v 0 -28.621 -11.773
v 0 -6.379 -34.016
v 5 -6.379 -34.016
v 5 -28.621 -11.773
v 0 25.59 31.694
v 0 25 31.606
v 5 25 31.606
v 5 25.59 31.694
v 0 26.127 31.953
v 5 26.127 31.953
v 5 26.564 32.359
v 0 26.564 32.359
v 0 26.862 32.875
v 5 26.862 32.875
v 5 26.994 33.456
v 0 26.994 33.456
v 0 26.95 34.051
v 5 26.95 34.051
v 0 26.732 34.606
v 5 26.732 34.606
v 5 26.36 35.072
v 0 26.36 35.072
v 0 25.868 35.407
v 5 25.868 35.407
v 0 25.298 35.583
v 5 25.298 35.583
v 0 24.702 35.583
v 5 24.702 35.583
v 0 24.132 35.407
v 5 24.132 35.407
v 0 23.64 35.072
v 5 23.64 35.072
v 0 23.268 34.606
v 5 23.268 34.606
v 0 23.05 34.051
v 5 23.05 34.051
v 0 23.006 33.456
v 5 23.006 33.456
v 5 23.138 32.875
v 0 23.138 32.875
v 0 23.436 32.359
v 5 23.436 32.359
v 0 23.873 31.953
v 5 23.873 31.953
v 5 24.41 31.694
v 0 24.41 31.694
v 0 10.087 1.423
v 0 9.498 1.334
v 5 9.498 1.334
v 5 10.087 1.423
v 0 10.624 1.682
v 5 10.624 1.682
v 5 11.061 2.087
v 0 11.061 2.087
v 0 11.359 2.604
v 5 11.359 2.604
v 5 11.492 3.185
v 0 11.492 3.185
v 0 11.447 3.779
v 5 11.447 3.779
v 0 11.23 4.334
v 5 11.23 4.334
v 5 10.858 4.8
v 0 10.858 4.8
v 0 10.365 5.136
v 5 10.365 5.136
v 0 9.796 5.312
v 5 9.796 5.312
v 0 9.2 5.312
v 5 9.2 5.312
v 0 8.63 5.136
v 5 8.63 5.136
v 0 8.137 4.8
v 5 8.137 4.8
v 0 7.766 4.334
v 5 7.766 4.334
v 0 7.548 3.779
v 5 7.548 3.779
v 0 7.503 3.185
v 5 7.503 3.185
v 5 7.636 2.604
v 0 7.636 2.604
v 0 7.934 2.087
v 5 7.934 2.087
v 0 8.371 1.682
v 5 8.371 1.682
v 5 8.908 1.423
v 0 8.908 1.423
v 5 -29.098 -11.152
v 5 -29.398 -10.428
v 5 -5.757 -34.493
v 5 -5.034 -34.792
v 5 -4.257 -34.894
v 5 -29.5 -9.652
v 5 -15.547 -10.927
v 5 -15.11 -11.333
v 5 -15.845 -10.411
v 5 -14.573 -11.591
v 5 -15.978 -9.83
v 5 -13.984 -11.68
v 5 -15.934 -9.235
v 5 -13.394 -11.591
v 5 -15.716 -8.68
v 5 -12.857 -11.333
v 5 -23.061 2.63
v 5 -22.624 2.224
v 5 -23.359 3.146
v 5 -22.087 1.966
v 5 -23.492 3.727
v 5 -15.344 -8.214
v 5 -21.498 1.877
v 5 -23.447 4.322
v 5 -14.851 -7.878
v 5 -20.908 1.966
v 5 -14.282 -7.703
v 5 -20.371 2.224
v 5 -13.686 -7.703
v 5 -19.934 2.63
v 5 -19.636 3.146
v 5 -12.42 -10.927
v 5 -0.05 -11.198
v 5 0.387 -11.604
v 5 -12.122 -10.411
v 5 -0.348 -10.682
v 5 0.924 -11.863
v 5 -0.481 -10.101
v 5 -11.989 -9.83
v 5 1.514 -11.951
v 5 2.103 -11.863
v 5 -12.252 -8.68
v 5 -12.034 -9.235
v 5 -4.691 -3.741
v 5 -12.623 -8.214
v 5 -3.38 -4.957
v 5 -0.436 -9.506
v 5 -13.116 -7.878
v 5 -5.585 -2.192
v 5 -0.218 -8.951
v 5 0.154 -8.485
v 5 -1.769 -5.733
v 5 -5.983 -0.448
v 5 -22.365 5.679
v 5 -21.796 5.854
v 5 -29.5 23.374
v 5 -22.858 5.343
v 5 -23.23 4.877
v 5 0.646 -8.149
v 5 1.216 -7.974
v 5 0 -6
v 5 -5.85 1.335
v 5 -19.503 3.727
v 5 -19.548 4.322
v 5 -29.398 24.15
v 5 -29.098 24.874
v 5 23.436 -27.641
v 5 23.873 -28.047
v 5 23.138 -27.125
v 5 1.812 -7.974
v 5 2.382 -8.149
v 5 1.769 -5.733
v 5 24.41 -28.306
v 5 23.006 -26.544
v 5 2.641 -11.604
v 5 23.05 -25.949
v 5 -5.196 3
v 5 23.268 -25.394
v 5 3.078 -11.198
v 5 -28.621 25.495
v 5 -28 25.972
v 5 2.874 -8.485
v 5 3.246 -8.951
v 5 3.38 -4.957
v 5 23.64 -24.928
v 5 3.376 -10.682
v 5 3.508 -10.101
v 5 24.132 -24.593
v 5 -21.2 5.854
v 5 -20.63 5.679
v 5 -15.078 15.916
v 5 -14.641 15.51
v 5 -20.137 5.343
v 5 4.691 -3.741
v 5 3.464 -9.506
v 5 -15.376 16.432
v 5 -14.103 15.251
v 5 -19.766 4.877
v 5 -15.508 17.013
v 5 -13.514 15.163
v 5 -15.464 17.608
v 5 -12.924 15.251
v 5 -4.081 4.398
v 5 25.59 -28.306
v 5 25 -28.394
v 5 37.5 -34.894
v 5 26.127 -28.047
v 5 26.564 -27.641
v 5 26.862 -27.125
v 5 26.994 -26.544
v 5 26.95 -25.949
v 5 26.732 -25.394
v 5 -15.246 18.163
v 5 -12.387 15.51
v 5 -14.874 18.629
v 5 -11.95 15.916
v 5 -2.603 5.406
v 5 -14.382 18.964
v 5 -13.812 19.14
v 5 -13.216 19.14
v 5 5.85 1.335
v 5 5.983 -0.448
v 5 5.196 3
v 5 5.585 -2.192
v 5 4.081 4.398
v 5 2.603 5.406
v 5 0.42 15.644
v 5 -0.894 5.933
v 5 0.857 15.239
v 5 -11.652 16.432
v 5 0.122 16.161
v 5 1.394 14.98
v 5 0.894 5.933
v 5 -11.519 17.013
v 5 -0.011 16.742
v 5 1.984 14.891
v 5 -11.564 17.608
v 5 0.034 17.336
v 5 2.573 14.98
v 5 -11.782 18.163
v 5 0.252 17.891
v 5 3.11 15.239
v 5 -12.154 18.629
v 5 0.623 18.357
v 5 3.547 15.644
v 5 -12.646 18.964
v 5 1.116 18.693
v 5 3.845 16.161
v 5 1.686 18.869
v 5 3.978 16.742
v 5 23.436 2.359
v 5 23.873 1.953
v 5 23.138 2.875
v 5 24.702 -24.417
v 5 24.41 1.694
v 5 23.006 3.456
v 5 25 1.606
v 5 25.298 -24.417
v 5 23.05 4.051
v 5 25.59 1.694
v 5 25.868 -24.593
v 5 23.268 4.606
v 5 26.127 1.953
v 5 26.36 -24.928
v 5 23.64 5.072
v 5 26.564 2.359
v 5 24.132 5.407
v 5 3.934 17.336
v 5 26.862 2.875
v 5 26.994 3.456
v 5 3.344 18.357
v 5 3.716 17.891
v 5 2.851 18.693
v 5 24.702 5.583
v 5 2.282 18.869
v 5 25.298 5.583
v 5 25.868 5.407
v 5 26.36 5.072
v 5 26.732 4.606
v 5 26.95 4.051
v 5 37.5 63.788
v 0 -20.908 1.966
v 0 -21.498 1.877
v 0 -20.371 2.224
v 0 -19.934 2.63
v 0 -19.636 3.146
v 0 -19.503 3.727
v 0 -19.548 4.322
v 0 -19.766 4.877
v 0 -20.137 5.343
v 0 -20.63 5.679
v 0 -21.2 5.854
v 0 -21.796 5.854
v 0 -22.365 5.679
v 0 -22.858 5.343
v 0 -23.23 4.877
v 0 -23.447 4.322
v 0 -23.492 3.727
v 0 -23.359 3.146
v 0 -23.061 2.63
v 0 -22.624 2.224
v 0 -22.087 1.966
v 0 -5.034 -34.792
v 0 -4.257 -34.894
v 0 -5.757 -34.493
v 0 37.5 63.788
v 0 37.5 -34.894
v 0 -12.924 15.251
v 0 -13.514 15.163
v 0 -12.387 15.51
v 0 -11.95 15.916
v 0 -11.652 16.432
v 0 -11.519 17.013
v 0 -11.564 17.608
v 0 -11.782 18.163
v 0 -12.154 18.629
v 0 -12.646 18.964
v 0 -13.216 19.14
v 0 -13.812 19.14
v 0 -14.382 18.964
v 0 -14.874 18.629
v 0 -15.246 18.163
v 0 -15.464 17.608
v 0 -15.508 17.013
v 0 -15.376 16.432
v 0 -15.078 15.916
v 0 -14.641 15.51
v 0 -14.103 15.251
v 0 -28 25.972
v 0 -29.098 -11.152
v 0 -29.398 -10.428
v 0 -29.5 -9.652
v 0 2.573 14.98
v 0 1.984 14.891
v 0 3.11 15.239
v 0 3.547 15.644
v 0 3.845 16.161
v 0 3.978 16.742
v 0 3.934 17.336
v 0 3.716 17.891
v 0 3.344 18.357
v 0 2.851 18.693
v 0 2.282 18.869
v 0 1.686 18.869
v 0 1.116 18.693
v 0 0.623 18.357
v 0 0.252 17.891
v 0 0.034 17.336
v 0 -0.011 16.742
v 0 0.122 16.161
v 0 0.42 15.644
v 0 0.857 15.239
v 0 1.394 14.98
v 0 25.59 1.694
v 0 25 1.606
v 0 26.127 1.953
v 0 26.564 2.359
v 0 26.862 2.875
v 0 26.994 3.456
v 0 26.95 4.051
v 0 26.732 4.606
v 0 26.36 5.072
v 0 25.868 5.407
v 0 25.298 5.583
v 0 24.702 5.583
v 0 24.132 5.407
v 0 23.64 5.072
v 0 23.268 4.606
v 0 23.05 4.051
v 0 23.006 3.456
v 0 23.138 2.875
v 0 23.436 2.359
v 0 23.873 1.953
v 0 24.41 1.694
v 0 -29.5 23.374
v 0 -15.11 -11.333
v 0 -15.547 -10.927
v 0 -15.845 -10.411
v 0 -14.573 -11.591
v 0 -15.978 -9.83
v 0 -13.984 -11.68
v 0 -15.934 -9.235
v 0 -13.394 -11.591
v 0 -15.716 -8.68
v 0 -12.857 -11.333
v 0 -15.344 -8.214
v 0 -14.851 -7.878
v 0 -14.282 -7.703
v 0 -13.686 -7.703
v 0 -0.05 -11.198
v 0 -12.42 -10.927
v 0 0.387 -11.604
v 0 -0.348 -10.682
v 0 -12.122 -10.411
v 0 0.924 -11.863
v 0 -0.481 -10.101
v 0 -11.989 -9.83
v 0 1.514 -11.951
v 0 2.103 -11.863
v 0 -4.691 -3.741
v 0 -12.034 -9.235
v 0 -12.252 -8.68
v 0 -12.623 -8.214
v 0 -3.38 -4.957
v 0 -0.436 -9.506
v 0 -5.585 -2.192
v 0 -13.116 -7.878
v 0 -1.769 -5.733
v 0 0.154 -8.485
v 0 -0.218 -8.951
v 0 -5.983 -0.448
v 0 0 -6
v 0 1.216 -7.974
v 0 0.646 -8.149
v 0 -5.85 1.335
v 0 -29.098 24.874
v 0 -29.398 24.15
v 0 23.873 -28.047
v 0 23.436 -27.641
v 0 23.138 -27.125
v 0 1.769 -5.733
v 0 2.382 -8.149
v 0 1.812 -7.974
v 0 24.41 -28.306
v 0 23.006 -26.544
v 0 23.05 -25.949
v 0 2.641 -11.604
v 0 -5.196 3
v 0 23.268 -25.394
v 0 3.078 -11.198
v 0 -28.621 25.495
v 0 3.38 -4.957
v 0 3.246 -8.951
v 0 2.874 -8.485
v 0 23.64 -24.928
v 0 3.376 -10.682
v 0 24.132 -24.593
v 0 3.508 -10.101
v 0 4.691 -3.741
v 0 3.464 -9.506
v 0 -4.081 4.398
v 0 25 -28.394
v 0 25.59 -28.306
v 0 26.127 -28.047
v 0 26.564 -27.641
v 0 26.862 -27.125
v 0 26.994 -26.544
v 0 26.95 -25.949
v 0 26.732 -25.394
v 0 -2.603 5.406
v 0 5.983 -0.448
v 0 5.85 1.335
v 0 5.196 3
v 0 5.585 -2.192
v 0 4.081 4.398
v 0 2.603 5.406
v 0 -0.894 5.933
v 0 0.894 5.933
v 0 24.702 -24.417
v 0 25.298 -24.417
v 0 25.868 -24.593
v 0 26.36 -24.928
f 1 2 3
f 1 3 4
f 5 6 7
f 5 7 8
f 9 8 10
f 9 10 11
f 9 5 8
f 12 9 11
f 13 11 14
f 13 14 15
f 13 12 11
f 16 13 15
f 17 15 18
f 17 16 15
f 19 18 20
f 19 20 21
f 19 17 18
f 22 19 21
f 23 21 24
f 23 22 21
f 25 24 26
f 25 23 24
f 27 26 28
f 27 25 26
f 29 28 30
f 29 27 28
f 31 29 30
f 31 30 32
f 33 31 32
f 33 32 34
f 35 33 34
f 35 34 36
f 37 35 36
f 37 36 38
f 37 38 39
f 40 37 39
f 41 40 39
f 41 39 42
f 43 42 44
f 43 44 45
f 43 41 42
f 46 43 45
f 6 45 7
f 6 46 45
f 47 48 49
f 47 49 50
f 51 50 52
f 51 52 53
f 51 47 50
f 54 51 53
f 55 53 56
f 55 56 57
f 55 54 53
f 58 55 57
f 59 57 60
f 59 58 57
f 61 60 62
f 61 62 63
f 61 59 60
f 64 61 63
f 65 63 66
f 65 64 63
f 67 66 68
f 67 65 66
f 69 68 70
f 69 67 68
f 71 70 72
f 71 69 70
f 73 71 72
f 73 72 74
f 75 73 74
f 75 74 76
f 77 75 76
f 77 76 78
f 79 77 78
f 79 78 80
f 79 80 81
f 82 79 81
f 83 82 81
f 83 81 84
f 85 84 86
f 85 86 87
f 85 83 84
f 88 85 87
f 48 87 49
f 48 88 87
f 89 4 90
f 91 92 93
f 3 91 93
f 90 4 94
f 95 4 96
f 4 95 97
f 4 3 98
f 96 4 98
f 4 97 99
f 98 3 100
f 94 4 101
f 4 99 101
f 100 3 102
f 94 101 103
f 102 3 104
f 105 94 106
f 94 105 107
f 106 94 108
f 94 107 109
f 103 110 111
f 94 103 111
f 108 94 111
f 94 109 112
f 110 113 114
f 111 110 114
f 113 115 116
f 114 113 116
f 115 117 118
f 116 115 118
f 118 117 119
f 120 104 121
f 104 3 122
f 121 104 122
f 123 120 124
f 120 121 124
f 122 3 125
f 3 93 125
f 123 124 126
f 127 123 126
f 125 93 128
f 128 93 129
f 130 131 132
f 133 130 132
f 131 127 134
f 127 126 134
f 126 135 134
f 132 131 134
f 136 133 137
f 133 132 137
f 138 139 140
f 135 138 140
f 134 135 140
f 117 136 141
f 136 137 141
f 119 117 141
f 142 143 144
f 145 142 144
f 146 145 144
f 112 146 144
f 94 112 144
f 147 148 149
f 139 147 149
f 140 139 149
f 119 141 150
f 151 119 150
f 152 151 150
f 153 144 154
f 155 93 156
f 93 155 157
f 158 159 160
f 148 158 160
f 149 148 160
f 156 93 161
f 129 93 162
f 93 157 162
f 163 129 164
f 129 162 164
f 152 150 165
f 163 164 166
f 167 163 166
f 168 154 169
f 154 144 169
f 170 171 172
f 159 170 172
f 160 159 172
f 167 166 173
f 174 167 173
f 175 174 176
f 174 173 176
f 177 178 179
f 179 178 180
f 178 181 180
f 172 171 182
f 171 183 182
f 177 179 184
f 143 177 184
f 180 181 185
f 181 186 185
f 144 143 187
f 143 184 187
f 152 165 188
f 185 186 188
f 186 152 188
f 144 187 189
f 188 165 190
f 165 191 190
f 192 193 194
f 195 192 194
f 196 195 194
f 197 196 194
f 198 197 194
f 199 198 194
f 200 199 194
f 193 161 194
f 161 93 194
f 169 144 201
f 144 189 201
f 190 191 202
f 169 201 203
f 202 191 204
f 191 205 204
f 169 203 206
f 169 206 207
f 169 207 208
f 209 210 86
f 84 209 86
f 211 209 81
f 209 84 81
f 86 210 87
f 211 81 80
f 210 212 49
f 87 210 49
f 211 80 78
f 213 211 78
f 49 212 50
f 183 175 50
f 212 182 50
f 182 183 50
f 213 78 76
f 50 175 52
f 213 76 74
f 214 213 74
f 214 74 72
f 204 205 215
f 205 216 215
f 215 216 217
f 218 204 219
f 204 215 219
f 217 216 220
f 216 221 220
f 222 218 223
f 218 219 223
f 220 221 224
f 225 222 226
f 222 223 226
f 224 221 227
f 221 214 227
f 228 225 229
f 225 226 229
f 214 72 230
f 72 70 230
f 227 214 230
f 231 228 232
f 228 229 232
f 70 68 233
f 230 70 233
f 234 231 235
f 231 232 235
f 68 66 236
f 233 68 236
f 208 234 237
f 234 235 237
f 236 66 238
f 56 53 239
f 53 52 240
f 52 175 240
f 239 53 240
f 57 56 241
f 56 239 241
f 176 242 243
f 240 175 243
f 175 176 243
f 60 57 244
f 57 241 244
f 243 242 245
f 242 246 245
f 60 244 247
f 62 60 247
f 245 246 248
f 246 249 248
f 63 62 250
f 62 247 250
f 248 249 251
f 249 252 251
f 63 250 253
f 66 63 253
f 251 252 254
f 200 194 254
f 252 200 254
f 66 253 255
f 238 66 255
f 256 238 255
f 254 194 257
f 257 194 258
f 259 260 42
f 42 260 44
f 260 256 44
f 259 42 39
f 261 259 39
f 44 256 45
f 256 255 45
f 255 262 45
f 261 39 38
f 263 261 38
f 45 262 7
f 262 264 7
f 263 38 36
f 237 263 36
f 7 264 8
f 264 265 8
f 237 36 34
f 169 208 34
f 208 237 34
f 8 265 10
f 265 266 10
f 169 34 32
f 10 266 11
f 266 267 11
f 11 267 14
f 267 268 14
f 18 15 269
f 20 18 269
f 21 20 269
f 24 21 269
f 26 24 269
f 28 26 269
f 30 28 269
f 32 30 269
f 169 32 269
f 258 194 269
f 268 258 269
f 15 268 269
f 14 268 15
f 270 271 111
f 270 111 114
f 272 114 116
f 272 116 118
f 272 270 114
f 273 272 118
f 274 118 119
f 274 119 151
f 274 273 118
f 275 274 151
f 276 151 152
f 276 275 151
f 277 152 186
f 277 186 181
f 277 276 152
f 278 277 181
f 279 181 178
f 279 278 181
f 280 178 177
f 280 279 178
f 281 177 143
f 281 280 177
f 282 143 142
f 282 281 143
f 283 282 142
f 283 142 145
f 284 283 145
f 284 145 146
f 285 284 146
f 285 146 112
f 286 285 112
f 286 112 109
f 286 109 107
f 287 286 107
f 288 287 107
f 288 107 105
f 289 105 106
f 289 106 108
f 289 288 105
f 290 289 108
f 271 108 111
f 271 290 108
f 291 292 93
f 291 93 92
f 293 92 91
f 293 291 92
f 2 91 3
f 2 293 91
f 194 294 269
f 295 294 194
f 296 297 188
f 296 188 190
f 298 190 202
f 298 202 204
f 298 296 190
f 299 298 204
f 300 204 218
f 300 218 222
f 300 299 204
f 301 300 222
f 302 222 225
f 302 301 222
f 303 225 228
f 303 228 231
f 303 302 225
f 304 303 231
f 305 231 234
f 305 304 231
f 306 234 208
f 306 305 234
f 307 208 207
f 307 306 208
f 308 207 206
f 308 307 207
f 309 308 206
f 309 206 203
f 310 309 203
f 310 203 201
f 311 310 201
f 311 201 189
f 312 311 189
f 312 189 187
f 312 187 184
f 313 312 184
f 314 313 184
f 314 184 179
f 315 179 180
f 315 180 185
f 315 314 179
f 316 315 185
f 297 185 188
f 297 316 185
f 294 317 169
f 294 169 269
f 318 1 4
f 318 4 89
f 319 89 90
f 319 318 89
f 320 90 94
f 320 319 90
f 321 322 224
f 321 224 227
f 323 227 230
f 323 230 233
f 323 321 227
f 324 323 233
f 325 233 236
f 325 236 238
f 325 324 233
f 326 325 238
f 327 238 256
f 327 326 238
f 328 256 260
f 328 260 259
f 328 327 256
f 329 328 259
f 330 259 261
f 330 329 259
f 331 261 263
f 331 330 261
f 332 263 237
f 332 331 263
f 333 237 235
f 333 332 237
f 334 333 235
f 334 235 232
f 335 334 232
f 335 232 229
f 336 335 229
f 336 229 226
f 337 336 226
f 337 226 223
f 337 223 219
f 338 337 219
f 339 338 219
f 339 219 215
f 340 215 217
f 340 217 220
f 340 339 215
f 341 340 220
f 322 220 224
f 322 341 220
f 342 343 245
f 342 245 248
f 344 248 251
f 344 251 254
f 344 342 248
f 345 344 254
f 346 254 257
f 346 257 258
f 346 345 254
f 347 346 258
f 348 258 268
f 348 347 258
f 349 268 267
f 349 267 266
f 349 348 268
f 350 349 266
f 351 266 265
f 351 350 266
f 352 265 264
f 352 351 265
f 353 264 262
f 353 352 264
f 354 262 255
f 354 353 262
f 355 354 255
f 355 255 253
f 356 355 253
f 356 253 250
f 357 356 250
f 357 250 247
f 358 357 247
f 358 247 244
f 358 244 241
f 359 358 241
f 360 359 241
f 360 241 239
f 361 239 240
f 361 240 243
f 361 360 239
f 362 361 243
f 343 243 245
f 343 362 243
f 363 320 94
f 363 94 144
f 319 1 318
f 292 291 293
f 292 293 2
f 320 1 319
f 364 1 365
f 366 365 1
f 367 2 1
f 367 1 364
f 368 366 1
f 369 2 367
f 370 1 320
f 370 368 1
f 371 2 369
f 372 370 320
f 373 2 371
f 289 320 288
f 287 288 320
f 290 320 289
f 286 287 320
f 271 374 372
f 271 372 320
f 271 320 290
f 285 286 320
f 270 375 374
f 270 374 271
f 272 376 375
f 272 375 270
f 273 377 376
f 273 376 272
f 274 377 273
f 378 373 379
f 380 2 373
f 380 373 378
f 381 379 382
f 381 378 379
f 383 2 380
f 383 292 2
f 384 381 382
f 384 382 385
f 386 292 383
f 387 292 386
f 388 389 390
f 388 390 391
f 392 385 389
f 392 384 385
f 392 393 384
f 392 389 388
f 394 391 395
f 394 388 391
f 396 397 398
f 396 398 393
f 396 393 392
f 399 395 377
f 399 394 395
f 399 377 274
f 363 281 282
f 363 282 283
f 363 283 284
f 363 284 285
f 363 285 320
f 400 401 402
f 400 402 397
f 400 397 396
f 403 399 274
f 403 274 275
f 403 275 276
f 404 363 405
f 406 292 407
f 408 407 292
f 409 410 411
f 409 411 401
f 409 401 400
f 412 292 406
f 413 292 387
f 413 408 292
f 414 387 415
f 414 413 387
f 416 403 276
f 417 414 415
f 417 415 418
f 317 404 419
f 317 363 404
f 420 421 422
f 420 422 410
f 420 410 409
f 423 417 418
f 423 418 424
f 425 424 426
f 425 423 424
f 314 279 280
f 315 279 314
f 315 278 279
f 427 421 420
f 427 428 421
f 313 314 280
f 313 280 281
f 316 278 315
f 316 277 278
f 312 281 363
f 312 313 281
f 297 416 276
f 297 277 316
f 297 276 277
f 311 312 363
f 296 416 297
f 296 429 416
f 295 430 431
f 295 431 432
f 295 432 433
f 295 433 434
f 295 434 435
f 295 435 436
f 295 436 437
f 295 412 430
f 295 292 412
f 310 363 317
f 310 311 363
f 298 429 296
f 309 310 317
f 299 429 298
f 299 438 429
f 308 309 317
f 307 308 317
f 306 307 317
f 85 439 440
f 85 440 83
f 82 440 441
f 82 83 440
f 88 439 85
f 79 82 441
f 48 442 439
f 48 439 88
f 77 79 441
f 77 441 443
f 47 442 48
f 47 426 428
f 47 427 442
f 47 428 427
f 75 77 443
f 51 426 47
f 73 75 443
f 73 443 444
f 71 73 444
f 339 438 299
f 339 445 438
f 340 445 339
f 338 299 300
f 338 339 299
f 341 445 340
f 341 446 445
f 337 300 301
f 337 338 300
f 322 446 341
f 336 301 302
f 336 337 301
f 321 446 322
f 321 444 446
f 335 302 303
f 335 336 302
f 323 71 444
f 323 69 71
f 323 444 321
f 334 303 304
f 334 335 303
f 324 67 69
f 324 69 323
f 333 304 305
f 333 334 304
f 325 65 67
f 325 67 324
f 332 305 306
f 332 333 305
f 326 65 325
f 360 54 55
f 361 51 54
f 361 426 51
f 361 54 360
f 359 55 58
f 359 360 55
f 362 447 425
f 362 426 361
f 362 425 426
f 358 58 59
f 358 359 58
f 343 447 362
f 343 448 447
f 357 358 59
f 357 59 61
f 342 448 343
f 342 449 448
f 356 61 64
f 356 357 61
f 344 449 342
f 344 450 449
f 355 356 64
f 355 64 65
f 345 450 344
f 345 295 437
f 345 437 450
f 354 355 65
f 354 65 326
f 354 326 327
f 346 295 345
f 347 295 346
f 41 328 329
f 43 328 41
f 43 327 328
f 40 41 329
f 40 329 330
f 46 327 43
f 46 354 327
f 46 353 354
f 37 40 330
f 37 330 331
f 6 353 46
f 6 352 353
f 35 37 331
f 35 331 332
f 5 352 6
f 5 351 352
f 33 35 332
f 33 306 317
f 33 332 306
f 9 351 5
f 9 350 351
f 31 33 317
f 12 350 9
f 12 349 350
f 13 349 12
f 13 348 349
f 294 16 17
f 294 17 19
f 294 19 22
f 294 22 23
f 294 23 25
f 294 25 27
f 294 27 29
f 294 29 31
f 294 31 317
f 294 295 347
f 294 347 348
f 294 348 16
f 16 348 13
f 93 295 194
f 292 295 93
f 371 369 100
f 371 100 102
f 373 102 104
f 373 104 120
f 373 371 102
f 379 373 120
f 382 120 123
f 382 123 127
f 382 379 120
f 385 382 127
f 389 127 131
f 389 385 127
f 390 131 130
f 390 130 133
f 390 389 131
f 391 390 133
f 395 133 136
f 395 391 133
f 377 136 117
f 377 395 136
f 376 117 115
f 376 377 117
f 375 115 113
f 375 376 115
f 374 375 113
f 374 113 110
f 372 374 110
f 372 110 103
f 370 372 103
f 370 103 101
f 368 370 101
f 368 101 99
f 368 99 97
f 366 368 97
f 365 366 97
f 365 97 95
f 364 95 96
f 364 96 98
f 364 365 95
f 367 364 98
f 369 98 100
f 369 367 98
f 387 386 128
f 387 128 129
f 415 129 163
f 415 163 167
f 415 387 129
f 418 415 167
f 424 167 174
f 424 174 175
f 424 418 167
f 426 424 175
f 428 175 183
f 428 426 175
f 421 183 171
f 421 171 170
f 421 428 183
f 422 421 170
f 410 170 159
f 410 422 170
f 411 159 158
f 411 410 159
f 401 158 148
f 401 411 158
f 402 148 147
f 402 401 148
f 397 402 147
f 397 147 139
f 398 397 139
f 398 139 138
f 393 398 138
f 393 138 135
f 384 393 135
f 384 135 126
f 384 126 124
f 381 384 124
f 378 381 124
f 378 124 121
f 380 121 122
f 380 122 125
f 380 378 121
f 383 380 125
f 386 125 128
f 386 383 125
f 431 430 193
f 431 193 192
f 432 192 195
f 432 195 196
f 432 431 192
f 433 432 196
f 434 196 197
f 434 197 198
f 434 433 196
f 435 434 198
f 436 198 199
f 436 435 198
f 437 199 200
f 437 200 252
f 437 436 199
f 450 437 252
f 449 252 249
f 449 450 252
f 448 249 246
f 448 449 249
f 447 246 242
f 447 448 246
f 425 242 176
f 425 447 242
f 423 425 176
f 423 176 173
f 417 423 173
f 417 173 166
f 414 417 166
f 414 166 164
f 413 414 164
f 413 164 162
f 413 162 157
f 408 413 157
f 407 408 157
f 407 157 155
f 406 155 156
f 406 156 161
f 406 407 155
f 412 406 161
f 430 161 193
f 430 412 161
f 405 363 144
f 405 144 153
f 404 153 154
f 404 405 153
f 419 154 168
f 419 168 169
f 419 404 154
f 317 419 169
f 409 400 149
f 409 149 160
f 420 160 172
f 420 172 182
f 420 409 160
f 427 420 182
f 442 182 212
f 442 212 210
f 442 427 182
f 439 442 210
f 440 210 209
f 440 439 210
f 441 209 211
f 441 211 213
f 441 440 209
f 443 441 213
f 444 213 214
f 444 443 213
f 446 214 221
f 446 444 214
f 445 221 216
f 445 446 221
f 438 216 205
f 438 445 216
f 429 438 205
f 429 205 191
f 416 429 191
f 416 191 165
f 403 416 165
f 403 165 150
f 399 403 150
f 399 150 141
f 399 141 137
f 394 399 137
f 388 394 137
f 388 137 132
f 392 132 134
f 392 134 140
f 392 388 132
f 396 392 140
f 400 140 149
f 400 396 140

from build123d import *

# Parameters (mm, degrees)
SKETCH1_R           = 6
SKETCH1_R_2         = 2
BOSS_EXTRUDE1_DEPTH = 5


with BuildPart() as part:
    # Sketch1 → Boss-Extrude1 (new body)
    with BuildSketch(Plane(origin=(0, 0, 0), x_dir=(0, 0, -1), z_dir=(1, 0, 0))):
        with BuildLine():
            Line((34.894448725, 36.555579518), (34.894448725, -4.257359313))
            ThreePointArc((34.894448725, -4.257359313), (34.666087322, -5.40540961), (34.015769068, -6.378679656))
            Line((34.015769068, -6.378679656), (11.773128381, -28.621320344))
            ThreePointArc((11.773128381, -28.621320344), (10.799858335, -29.271638598), (9.651808037, -29.5))
            Line((9.651808037, -29.5), (-23.373500468, -29.5))
            ThreePointArc((-23.373500468, -29.5), (-24.873500468, -29.098076211), (-25.971576679, -28))
            Line((-25.971576679, -28), (-63.788019311, 37.5))
            Line((-63.788019311, 37.5), (34.894448725, 37.5))
            Line((34.894448725, 37.5), (34.894448725, 36.555579518))
        make_face()
        Circle(SKETCH1_R, mode=Mode.SUBTRACT)
        with Locations((9.68016301, -13.983720681)):
            Circle(SKETCH1_R_2, mode=Mode.SUBTRACT)
        with Locations((-3.876799059, -21.49762642)):
            Circle(SKETCH1_R_2, mode=Mode.SUBTRACT)
        with Locations((-17.162513345, -13.513905738)):
            Circle(SKETCH1_R_2, mode=Mode.SUBTRACT)
        with Locations((-16.891265561, 1.983720681)):
            Circle(SKETCH1_R_2, mode=Mode.SUBTRACT)
        with Locations((-3.334303492, 9.49762642)):
            Circle(SKETCH1_R_2, mode=Mode.SUBTRACT)
        with Locations((9.951410794, 1.513905738)):
            Circle(SKETCH1_R_2, mode=Mode.SUBTRACT)
        with Locations((-3.605551275, 25)):
            Circle(SKETCH1_R_2, mode=Mode.SUBTRACT)
        with Locations((26.394448725, 25)):
            Circle(SKETCH1_R_2, mode=Mode.SUBTRACT)
        with Locations((-33.605551275, 25)):
            Circle(SKETCH1_R_2, mode=Mode.SUBTRACT)
    extrude(amount=BOSS_EXTRUDE1_DEPTH)


solid = part.part
